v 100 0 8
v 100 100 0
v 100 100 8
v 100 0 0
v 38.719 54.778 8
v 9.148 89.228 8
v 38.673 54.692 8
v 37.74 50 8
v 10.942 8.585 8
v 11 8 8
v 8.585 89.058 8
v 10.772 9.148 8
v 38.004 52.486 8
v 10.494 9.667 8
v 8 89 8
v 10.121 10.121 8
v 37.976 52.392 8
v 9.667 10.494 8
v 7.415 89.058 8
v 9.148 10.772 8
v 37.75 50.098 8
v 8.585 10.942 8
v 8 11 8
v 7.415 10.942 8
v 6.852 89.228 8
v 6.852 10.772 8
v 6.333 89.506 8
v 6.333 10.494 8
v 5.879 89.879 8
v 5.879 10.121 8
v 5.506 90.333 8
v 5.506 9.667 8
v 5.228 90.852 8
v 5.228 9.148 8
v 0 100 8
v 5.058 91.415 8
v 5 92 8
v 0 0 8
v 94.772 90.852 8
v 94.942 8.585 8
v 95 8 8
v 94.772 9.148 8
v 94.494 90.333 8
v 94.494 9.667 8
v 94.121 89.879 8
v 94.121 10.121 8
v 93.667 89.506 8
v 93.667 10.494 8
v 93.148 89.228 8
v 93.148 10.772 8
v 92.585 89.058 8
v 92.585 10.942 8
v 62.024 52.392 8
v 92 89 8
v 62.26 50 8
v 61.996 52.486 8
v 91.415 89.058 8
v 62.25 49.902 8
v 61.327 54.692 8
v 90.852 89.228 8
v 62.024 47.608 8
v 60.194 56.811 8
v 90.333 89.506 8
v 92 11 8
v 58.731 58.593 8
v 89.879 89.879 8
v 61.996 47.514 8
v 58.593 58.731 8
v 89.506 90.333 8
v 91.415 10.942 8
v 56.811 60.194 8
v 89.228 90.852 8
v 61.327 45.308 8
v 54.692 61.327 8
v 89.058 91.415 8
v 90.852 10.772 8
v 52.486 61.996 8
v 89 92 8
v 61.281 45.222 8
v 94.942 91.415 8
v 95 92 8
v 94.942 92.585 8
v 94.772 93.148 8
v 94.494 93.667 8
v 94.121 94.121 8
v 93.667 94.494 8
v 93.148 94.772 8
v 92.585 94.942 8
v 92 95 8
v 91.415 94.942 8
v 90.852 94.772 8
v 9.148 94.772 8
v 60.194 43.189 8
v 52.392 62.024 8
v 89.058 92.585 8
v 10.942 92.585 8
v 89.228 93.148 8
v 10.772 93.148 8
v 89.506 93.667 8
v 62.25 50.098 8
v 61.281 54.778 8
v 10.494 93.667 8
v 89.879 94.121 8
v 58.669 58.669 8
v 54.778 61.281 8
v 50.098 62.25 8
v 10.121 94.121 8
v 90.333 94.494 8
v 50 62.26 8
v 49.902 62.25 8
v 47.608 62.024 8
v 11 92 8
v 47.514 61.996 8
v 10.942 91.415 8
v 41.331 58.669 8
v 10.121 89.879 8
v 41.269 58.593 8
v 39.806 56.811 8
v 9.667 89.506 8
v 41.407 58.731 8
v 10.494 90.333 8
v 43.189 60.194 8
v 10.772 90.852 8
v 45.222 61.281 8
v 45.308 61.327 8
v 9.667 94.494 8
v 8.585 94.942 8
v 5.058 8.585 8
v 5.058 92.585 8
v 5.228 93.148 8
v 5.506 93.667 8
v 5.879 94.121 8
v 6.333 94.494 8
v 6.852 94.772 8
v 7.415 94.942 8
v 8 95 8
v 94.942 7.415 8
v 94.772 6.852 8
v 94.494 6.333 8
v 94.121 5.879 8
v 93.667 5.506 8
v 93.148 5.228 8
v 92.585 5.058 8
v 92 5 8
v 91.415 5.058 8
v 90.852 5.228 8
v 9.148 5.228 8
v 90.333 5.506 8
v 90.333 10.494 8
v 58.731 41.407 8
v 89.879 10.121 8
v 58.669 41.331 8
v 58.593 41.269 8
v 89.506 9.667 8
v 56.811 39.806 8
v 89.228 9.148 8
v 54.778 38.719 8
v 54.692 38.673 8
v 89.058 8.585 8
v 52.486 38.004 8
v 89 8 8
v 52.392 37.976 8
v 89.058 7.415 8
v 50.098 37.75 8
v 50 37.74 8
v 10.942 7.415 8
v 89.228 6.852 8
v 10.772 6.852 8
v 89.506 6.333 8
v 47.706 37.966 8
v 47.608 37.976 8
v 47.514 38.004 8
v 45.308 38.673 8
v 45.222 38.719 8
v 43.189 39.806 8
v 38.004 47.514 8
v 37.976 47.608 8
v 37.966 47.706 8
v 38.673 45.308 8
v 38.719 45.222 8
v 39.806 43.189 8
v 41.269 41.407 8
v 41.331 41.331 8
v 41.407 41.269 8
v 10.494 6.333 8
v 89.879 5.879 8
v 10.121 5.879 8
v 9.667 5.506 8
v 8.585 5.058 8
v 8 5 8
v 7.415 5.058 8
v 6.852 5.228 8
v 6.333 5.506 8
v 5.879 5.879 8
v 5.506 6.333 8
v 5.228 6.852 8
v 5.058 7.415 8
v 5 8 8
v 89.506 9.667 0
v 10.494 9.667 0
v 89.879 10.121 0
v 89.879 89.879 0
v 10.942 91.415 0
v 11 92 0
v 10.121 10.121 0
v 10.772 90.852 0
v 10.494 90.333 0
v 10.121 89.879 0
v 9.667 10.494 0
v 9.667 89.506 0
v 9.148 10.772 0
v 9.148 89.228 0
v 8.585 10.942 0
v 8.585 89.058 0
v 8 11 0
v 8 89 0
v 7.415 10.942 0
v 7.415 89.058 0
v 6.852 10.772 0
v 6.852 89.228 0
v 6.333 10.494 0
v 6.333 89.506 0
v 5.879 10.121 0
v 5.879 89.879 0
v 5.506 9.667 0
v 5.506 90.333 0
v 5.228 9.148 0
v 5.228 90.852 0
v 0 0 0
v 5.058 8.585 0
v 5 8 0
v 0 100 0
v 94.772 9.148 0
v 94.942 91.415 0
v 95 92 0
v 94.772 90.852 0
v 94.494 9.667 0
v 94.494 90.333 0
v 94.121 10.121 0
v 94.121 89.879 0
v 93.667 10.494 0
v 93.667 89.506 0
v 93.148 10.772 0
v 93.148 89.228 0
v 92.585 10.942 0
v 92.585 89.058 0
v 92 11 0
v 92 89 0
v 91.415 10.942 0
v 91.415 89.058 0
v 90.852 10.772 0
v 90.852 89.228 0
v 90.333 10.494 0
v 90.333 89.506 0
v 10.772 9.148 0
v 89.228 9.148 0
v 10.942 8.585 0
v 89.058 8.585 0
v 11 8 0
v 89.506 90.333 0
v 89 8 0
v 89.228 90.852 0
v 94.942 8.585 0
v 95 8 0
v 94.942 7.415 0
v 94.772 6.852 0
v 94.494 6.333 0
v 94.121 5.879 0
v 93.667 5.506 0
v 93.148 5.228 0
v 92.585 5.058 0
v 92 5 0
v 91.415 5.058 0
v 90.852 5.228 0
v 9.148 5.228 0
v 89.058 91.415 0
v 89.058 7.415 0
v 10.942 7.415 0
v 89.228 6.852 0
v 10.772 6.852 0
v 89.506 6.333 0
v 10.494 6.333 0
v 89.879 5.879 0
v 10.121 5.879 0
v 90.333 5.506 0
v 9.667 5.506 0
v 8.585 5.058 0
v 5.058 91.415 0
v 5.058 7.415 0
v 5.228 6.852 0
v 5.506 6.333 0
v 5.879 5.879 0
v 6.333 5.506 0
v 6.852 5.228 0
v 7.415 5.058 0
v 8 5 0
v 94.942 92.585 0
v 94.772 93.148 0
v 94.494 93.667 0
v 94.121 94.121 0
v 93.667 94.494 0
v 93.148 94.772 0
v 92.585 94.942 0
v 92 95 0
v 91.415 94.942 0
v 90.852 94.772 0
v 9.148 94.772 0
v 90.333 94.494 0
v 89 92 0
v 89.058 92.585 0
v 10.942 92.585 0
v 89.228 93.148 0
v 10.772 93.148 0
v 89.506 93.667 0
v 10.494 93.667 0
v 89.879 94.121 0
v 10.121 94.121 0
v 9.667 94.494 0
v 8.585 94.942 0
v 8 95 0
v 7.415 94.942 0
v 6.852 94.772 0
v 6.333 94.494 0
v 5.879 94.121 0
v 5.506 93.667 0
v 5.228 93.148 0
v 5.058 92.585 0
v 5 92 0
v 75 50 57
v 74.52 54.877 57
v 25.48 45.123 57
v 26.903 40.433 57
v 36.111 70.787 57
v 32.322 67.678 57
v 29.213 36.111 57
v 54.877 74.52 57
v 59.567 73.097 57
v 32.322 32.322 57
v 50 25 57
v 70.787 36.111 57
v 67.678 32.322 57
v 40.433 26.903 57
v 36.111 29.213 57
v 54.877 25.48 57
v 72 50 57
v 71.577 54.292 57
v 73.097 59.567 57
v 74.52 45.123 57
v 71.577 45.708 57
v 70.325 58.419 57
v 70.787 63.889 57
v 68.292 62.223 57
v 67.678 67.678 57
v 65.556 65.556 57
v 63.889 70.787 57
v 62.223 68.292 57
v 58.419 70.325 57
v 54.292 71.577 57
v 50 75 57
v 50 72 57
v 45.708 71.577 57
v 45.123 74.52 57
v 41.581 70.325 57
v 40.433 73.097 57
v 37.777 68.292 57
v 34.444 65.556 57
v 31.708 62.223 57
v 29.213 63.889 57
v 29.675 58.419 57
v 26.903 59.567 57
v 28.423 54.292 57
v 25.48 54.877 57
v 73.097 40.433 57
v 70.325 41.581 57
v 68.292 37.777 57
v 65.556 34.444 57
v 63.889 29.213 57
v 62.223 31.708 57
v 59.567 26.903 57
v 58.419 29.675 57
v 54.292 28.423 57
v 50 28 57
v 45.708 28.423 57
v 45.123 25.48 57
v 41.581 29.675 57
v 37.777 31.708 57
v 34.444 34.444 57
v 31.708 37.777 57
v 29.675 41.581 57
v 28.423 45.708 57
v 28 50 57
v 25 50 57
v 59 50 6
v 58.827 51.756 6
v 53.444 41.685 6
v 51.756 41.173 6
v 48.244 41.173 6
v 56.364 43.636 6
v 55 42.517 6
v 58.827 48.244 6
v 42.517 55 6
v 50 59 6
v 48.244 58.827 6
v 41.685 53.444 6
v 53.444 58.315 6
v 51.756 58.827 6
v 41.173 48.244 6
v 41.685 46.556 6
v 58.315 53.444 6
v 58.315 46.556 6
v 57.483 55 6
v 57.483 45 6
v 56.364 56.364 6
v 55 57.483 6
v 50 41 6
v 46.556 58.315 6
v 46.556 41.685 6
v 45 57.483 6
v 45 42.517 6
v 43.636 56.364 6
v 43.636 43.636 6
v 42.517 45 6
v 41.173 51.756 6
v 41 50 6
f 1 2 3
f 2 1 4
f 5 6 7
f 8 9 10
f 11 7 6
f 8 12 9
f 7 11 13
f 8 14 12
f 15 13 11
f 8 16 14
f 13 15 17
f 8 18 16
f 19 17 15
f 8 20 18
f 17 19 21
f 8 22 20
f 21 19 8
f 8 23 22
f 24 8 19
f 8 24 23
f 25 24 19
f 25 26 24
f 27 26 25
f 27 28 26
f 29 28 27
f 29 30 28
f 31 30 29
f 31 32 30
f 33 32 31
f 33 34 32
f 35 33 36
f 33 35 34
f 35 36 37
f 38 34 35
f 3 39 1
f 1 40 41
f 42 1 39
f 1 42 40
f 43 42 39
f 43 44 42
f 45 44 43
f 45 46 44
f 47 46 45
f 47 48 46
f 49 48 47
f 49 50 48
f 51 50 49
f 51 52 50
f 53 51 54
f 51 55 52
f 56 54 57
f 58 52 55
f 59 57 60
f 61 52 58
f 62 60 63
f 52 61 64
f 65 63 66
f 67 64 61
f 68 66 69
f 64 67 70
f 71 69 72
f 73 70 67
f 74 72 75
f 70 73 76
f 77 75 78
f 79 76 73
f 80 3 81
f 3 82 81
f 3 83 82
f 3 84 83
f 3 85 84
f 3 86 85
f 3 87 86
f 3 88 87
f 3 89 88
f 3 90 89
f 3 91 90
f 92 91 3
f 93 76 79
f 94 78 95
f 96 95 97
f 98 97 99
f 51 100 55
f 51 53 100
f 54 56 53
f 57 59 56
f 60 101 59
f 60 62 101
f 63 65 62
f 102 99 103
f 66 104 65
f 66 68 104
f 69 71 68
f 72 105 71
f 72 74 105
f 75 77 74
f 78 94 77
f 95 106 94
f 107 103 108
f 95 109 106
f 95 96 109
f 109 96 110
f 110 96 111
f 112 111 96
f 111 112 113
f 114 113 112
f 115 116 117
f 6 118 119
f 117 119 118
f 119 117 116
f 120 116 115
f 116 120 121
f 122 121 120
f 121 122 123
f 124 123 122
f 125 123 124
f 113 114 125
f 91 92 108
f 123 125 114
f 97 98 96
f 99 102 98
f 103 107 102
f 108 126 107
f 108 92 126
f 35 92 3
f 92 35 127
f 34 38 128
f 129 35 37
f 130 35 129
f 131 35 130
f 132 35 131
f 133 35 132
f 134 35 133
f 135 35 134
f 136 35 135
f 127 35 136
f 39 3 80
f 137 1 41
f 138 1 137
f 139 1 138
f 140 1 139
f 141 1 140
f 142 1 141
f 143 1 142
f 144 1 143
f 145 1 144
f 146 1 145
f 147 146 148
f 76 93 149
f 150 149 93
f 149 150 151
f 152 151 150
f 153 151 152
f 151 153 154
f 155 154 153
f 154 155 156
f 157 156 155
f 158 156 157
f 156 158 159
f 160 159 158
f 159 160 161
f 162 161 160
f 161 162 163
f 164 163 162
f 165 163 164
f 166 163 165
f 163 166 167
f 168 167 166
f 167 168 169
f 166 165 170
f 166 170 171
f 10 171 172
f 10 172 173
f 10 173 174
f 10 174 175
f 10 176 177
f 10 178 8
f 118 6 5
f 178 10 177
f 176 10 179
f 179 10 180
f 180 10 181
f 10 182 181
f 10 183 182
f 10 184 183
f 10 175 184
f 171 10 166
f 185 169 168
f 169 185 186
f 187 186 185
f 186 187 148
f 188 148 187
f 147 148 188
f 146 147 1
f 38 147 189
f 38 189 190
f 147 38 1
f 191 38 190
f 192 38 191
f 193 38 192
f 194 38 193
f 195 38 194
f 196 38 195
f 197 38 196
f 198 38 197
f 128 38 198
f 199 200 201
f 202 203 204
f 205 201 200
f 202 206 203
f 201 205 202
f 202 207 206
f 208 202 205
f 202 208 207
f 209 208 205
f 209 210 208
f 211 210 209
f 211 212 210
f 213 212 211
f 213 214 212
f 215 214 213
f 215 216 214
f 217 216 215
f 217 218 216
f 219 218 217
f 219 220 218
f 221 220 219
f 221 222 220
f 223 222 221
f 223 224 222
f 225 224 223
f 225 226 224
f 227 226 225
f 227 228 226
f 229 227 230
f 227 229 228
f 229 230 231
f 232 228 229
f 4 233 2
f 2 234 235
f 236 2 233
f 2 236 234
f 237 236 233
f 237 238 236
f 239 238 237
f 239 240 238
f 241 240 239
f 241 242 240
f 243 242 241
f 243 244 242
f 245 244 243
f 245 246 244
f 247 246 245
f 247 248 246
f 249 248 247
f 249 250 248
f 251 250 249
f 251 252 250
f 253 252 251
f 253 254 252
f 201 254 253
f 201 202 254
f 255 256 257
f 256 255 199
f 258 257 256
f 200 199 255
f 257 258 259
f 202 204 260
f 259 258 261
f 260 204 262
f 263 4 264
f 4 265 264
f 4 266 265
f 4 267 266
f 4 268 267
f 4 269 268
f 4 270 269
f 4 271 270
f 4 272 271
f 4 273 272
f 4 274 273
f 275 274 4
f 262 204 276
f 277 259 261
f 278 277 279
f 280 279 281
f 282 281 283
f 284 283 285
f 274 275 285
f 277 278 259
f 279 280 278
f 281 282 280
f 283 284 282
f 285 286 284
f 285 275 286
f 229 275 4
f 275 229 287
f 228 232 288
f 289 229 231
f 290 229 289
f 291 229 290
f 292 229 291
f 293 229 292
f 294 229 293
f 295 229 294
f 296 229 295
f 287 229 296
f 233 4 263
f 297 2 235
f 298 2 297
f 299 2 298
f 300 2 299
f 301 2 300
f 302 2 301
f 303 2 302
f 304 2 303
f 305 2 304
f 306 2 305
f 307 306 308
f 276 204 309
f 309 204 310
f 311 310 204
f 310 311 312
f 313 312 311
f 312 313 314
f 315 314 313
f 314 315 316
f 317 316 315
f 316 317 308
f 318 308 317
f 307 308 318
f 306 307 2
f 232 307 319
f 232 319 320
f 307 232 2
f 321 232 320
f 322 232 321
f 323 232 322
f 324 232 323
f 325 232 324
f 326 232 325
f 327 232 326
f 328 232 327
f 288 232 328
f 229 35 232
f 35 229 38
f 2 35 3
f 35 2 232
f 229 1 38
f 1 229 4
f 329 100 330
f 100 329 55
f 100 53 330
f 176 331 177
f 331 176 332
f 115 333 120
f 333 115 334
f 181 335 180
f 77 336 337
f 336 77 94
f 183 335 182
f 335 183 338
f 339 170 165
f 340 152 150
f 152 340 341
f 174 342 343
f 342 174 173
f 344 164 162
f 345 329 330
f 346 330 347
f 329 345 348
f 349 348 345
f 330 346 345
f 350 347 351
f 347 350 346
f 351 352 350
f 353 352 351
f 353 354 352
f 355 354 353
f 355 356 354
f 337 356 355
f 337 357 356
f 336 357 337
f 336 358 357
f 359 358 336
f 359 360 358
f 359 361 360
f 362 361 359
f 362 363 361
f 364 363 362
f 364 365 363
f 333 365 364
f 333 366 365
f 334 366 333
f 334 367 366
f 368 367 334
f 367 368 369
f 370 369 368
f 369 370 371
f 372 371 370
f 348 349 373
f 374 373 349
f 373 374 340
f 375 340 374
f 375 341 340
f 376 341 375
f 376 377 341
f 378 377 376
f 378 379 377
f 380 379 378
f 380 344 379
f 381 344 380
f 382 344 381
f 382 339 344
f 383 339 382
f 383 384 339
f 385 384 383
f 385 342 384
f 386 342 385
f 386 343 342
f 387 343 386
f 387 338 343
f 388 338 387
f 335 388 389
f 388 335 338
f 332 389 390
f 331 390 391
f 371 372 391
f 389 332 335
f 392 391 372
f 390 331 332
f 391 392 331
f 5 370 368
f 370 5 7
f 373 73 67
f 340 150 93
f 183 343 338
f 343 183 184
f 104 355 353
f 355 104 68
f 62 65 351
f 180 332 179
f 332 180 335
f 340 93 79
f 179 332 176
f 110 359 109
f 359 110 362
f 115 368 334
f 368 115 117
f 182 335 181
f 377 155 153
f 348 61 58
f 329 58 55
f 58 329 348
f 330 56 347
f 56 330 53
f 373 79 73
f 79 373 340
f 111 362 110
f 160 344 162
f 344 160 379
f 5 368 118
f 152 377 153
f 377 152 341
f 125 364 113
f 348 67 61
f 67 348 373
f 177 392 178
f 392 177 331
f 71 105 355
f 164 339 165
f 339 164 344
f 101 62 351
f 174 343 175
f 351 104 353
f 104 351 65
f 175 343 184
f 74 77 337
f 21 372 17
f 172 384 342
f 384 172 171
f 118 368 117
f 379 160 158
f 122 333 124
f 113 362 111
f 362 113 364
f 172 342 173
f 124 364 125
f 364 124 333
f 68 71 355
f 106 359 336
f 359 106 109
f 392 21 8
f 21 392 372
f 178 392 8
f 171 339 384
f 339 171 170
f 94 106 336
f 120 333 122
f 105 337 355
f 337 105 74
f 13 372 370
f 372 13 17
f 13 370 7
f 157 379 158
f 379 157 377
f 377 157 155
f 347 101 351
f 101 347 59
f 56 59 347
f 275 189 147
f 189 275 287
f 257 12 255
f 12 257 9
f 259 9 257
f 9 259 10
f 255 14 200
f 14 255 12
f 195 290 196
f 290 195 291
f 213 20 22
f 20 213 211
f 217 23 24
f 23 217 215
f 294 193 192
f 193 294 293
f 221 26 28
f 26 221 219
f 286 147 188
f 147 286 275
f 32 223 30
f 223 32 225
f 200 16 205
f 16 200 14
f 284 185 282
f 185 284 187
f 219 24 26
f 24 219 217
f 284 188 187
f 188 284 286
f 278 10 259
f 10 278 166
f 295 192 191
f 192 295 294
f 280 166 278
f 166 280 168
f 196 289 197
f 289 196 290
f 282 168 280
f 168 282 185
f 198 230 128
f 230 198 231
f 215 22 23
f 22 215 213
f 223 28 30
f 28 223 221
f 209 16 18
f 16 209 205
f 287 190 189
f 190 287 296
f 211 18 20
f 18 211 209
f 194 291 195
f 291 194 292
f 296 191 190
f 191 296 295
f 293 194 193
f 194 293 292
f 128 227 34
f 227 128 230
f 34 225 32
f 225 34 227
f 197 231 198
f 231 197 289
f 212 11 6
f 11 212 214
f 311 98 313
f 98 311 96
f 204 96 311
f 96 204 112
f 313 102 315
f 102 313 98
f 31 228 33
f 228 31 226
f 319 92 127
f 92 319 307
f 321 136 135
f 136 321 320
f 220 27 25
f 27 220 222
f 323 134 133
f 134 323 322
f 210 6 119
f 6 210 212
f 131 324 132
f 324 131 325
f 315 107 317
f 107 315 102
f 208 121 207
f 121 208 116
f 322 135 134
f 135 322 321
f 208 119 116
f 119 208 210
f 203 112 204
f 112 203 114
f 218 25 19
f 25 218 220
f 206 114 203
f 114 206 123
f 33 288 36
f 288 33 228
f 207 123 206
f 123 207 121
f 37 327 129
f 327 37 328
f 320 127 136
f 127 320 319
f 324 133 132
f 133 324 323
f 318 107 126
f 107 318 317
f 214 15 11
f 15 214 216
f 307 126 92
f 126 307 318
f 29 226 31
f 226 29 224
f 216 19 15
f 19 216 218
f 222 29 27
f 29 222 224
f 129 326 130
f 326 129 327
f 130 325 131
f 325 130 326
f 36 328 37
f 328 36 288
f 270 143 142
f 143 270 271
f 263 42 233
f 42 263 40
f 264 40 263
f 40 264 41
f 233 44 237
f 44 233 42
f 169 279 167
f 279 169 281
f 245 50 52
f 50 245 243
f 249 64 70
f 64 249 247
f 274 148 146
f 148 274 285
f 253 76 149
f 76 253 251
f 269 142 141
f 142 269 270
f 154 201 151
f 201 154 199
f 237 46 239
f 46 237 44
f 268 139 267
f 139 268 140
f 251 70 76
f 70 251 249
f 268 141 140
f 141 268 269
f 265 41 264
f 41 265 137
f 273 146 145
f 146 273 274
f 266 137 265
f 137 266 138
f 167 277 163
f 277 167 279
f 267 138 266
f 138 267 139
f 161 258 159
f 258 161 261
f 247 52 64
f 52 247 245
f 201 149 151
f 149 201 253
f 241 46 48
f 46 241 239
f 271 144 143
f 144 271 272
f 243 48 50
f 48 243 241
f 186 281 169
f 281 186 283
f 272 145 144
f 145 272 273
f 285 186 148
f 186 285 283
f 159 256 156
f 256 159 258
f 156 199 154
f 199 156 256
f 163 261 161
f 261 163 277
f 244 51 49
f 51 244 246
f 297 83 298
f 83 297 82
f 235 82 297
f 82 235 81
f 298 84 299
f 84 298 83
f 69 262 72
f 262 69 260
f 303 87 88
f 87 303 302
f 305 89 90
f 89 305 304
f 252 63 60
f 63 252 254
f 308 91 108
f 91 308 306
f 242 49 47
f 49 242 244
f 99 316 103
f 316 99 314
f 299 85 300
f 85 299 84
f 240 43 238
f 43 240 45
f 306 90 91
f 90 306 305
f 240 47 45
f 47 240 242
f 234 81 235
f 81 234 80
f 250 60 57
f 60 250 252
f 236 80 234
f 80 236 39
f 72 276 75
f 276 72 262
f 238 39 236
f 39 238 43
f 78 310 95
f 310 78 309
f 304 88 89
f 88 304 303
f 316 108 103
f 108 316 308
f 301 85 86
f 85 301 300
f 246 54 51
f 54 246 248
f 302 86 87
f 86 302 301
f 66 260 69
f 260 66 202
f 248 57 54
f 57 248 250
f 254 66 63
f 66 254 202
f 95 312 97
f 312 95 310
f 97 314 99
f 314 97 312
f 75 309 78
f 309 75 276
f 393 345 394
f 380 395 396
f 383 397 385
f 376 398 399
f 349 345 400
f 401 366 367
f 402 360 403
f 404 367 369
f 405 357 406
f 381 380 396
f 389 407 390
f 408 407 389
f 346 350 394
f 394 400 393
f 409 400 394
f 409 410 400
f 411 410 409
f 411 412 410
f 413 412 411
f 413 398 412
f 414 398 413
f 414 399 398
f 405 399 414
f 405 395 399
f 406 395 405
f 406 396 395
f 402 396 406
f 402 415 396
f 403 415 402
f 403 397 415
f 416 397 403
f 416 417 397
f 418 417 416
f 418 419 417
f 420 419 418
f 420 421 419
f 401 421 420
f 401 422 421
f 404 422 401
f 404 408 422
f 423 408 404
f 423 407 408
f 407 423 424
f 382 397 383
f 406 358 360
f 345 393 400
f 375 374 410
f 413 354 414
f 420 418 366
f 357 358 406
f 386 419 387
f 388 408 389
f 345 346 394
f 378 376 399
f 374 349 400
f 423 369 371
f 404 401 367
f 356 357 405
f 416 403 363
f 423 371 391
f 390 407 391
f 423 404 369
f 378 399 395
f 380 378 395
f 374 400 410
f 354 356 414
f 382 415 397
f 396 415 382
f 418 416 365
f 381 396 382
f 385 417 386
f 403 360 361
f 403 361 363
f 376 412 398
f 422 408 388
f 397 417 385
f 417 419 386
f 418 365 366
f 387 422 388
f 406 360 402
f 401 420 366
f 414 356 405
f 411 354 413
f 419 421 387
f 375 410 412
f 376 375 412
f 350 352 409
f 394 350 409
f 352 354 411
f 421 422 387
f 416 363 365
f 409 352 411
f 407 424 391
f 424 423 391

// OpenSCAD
$fn = 32;

// ----------------------------------------------------------------------
// Hopper: flanged with square flange
// ----------------------------------------------------------------------

// --- parameters (mm) ---
fl = 100;                 // flange side, X and Y
fl_t = 8;                 // flange thickness
cone_h = 50;              // cone height above the flange
top_d = 50;               // cone mouth diameter
bot_d = 24;               // cone spout diameter
wall = 3;                 // cone wall thickness
hole_r = 3;               // flange hole radius
hole_in = 8;              // hole inset from the corners

bore_d = bot_d - 2 * wall;  // spout bore diameter
total_h = fl_t + cone_h - 1;  // overall height

difference() {
  union() {
    cube([fl, fl, fl_t]);
    translate([fl / 2, fl / 2, fl_t - 1])
      cylinder(h = cone_h, d1 = bot_d, d2 = top_d);
  }
  translate([fl / 2, fl / 2, fl_t - 2])
    cylinder(h = cone_h + 1, d1 = bore_d, d2 = top_d - 2 * wall);
  for (sx = [0, 1], sy = [0, 1])
    translate([sx ? fl - hole_in : hole_in,
               sy ? fl - hole_in : hole_in, -1])
      cylinder(r = hole_r, h = fl_t + 2);
}
